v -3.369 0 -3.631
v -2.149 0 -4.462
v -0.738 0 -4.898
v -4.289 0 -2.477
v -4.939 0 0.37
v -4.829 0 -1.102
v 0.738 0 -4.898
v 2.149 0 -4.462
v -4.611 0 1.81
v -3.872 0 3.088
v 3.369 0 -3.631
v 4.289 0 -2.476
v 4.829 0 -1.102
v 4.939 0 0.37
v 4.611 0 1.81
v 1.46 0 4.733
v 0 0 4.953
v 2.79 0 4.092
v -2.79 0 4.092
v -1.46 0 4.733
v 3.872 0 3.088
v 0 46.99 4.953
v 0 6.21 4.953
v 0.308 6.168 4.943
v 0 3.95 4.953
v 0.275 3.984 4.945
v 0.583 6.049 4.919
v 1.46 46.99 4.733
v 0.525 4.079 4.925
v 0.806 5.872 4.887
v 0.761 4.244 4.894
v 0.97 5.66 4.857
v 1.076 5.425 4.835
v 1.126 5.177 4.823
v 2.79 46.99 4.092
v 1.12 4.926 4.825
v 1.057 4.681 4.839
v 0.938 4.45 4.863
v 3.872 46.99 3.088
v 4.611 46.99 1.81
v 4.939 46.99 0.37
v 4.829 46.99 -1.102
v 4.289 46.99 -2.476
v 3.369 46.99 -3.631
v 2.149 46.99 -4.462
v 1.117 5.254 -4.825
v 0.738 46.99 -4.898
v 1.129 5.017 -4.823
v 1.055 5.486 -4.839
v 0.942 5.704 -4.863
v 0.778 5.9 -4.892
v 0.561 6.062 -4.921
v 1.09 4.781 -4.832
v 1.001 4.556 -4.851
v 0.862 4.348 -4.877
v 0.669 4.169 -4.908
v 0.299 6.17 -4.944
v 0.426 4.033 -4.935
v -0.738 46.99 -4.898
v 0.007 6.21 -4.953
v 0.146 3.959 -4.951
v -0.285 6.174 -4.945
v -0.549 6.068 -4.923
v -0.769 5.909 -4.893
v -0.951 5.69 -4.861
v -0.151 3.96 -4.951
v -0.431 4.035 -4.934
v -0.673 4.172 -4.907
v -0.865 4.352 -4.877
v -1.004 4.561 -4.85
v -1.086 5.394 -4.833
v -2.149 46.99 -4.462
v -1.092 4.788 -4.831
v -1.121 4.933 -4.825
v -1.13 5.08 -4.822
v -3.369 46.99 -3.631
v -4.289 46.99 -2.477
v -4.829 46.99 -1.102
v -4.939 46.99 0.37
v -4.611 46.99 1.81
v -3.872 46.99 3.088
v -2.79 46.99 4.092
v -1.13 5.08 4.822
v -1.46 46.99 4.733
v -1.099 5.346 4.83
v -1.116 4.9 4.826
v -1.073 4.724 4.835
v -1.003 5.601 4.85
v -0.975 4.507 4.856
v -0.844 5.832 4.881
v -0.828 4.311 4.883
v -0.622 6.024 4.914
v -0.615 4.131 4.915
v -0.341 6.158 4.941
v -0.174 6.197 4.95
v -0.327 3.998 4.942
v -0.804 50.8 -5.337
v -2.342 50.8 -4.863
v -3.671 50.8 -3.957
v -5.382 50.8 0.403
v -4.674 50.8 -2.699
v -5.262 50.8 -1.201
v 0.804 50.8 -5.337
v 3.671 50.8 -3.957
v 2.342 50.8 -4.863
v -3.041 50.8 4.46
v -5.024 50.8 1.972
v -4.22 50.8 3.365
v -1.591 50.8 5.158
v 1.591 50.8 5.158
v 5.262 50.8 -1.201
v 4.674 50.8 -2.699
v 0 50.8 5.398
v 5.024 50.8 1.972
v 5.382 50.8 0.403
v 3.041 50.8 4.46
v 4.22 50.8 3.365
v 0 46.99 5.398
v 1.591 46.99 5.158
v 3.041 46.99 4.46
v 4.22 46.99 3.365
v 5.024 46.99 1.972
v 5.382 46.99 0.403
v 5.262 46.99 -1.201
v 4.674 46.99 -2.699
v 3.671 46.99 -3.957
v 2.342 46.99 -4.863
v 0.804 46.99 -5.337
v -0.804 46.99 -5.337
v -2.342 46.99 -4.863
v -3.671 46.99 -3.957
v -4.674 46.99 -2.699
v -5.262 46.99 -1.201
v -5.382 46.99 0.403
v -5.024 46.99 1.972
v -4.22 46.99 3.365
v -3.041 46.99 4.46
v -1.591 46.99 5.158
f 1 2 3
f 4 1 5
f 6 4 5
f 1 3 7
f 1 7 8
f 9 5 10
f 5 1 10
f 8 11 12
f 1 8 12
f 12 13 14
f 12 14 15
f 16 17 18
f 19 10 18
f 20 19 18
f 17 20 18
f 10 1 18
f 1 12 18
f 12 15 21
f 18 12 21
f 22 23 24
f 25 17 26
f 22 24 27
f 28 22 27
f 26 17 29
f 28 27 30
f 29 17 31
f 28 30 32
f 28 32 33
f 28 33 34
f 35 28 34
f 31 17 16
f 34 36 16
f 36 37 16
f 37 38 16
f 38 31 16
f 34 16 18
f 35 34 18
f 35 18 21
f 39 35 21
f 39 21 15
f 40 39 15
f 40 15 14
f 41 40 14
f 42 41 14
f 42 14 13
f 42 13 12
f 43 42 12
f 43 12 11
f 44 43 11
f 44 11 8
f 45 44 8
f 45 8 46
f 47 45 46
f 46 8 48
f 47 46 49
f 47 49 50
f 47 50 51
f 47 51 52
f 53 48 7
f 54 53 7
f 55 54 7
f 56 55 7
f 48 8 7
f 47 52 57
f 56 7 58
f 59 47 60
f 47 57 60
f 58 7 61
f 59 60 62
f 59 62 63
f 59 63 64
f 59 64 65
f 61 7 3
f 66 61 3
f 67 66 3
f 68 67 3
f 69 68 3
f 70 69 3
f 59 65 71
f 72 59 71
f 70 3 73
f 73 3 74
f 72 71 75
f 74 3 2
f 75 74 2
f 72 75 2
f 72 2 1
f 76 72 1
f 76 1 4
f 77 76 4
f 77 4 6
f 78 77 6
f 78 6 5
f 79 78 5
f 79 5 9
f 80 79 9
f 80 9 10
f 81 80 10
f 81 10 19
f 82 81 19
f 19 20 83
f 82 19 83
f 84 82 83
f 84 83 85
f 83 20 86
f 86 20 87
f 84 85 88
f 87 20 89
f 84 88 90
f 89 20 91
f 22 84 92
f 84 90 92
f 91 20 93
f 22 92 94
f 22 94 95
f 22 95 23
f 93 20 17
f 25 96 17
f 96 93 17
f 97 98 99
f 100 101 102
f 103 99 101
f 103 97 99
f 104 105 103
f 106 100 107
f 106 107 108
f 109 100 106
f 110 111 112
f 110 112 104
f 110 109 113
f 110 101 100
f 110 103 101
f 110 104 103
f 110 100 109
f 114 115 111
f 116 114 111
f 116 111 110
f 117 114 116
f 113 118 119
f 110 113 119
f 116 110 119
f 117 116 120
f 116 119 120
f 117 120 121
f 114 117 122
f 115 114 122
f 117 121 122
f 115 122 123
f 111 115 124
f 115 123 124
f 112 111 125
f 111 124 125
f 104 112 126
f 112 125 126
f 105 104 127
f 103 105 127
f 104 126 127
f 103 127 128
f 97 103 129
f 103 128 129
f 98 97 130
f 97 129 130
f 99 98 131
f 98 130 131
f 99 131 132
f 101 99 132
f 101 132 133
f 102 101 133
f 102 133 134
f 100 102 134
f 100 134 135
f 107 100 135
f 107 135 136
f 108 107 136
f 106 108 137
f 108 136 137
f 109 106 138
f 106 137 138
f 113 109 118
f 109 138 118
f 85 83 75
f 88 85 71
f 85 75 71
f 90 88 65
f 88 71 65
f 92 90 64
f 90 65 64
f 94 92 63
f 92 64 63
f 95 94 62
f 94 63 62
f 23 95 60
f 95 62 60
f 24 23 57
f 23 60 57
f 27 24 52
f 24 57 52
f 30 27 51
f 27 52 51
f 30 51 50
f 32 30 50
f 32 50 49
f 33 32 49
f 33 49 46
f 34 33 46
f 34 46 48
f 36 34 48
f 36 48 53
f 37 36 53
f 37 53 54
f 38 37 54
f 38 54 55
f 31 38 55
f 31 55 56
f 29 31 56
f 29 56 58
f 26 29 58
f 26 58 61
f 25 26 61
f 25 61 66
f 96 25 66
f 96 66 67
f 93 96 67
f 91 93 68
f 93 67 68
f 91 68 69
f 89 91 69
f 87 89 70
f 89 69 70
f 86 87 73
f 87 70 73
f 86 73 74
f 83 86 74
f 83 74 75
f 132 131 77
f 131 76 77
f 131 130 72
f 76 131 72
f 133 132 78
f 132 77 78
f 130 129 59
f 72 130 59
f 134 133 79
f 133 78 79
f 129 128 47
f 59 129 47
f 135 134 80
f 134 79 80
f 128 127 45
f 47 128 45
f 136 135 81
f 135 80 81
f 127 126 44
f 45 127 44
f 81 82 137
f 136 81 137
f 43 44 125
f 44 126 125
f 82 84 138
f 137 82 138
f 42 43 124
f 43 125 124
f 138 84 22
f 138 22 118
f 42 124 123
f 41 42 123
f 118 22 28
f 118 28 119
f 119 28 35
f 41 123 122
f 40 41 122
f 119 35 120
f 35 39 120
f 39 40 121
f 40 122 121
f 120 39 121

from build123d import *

# Parameters (mm, degrees)
SKETCH1_R             = 4.953
BOSS_EXTRUDE1_DEPTH   = 50.8
BOSS_EXTRUDE2_START   = -3.81
SKETCH2_R             = 5.3975
SKETCH2_R_2           = 4.953
BOSS_EXTRUDE2_DEPTH   = 3.81
F_4_40_TAPPED_HOLE1_D = 2.2606


with BuildPart() as part:
    # Sketch1 → Boss-Extrude1 (new body)
    with BuildSketch(Plane(origin=(0, 0, 0), x_dir=(1, 0, 0), z_dir=(0, 1, 0))):
        with Locations(Location((0, 0, 0), (0, 0, 270))):
            Circle(SKETCH1_R)
    extrude(amount=BOSS_EXTRUDE1_DEPTH)

    # Sketch2 → Boss-Extrude2 (add)
    with BuildSketch(Plane(origin=(0, 50.8, 0), x_dir=(1, 0, 0), z_dir=(0, 1, 0)).offset(BOSS_EXTRUDE2_START)):
        with Locations(Location((0, 0, 0), (0, 0, 270))):
            Circle(SKETCH2_R)
        with Locations(Location((0, 0, 0), (0, 0, 270))):
            Circle(SKETCH2_R_2, mode=Mode.SUBTRACT)
    extrude(amount=BOSS_EXTRUDE2_DEPTH)

    # #4-40 Tapped Hole1 (through all)
    with Locations(Plane.XY.offset(4.953)):
        with Locations((0, 5.08)):
            Hole(F_4_40_TAPPED_HOLE1_D / 2)


solid = part.part
